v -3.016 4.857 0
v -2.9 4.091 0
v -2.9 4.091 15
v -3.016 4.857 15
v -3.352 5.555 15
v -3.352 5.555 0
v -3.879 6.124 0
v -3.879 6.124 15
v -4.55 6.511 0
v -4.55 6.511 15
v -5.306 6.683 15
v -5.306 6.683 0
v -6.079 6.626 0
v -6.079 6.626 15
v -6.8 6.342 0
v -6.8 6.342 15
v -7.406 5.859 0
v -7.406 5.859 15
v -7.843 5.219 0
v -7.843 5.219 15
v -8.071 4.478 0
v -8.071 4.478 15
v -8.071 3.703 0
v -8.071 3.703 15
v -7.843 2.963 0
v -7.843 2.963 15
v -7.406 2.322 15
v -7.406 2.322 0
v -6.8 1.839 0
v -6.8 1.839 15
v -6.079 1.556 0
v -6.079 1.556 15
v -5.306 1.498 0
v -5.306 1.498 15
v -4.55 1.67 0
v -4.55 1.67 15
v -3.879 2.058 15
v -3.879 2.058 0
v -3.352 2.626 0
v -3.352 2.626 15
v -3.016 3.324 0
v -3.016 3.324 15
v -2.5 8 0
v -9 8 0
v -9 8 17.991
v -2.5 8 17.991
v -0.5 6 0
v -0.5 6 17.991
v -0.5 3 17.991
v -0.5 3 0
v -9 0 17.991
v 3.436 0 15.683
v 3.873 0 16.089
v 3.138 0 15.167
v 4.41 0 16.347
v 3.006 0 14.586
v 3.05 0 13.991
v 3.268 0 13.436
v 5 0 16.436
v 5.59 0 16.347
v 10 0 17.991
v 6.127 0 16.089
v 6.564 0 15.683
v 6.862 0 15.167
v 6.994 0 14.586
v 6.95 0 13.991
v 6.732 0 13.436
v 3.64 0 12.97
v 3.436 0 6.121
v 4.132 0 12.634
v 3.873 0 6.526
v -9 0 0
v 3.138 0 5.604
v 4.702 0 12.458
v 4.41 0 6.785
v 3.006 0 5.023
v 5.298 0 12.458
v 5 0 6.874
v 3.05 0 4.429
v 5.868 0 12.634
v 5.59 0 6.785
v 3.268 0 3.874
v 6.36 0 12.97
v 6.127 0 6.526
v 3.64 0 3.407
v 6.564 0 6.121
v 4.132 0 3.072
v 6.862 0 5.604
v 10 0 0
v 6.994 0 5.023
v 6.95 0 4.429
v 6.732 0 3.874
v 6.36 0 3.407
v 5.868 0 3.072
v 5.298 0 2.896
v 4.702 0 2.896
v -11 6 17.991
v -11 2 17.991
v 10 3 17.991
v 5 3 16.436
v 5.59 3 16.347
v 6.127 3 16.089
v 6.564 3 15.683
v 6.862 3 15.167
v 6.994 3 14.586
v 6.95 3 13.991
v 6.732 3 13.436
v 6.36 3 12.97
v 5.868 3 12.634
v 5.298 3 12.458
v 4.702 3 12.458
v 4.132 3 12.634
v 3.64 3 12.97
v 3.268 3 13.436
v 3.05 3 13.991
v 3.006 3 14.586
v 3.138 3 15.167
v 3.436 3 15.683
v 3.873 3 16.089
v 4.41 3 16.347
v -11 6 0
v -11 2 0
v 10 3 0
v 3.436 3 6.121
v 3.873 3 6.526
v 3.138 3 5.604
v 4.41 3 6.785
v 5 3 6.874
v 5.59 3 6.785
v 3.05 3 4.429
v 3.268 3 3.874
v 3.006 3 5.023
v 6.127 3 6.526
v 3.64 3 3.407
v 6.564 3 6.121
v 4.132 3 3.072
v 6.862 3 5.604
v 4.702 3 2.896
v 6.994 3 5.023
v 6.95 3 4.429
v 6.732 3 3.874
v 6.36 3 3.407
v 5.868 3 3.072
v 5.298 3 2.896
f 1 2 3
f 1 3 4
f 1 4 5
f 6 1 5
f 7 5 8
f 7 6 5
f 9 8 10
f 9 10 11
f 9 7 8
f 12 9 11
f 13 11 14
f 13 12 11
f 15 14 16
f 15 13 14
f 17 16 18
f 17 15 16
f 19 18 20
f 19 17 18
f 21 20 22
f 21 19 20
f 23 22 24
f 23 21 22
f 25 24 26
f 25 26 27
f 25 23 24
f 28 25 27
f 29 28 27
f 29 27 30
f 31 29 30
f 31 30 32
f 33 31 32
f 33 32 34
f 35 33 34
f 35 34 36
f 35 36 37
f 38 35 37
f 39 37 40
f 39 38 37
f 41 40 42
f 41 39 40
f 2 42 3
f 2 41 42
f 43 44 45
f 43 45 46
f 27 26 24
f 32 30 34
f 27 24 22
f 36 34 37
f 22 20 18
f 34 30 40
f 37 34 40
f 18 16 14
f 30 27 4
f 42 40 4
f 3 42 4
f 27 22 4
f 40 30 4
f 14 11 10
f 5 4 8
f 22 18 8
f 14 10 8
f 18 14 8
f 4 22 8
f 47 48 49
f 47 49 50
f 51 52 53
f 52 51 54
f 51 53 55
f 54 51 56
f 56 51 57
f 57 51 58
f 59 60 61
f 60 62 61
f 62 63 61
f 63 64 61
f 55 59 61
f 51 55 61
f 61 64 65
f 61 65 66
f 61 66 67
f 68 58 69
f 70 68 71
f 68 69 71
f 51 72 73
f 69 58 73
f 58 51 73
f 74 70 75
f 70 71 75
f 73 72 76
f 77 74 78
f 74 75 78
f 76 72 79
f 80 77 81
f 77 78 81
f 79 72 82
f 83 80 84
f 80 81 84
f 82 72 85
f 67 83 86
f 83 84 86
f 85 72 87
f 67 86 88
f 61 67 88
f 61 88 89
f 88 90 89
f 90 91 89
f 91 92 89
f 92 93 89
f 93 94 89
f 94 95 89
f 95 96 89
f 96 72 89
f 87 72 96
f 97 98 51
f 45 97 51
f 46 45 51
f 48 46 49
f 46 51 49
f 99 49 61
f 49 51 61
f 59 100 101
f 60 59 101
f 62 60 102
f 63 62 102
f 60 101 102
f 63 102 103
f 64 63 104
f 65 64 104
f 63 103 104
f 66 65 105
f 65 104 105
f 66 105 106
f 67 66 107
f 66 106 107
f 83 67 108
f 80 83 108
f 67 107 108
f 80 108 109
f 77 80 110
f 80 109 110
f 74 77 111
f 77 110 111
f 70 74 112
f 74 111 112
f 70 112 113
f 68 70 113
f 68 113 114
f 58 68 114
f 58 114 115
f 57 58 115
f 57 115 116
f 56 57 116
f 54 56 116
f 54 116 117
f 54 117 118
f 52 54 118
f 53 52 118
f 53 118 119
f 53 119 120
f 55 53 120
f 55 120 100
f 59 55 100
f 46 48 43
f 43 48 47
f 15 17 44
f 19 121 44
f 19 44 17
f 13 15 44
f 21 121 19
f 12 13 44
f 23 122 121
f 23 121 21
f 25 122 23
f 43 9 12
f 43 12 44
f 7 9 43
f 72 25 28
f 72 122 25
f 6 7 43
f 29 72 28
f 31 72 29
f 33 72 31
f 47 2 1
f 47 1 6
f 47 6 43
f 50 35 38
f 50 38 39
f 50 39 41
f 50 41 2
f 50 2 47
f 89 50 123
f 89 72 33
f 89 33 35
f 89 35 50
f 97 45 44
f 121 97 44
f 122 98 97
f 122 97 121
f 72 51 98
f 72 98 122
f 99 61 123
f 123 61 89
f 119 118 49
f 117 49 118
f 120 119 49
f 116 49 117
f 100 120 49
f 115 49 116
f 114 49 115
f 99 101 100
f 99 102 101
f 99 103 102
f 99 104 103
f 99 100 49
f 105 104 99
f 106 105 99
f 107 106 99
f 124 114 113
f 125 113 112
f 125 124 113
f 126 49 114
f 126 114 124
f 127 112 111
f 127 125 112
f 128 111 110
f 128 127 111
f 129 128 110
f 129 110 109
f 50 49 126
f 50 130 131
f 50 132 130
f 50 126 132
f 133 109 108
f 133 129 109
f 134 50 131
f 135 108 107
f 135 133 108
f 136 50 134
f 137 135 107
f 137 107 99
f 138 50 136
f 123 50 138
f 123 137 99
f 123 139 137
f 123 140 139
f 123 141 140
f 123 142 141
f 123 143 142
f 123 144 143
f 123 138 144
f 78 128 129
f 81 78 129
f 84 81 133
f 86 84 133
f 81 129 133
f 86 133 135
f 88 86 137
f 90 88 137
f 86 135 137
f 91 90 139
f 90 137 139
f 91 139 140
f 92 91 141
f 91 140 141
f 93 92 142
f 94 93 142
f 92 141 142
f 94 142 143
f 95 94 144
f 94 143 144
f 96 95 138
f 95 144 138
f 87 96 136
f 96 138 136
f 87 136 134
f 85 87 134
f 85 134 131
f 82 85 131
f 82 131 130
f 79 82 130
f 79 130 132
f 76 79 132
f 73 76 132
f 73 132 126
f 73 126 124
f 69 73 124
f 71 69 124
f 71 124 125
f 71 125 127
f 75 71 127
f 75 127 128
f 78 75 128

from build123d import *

# Parameters (mm, degrees)
SKETCH_1_W          = 21
SKETCH_1_H          = 17.990855805
EXTRUDE_1_DEPTH     = 8
SKETCH_2_W          = 10.499999995
SKETCH_2_H          = 17.994369167
CUT_EXTRUDE_1_DEPTH = 5
SKETCH_3_R          = 1.999999882
SKETCH_3_R_2        = 1.999999942
CUT_EXTRUDE_2_DEPTH = 22.671891763
SKETCH_4_R          = 2.6
CUT_EXTRUDE_3_DEPTH = 15
CHAMFER_1_SIZE      = 2


with BuildPart() as part:
    # Эскиз1 → Вытянуть1 (new body)
    with BuildSketch(Plane(origin=(0, 0, 0), x_dir=(1, 0, 0), z_dir=(0, 1, 0))):
        with Locations((-0.5, -8.995427903)):
            Rectangle(SKETCH_1_W, SKETCH_1_H)
    extrude(amount=EXTRUDE_1_DEPTH)

    # Эскиз2 → Вырез-Вытянуть1 (cut)
    with BuildSketch(Plane(origin=(0, 8, 0), x_dir=(1, 0, 0), z_dir=(0, 1, 0))):
        with Locations((4.749999998, -8.993671222)):
            Rectangle(SKETCH_2_W, SKETCH_2_H)
    extrude(amount=-CUT_EXTRUDE_1_DEPTH, mode=Mode.SUBTRACT)

    # Эскиз3 → Вырез-Вытянуть2 (cut, through all)
    with BuildSketch(Plane(origin=(0, 3, 0), x_dir=(1, 0, 0), z_dir=(0, 1, 0))):
        with Locations(Location((4.999999995, -14.436118586, 0), (0, 0, 270))):
            Circle(SKETCH_3_R)
        with Locations(Location((4.999999995, -4.873583798, 0), (0, 0, 270))):
            Circle(SKETCH_3_R_2)
    extrude(amount=-CUT_EXTRUDE_2_DEPTH, mode=Mode.SUBTRACT)

    # Эскиз4 → Вырез-Вытянуть3 (cut)
    with BuildSketch(Plane.XY):
        with Locations((-5.500000032, 4.090743194)):
            Circle(SKETCH_4_R)
    extrude(amount=CUT_EXTRUDE_3_DEPTH, mode=Mode.SUBTRACT)

    # Фаска1
    chamfer_1_edges = [part.edges().sort_by_distance(p)[0] for p in [
        (-0.5, 8, 8.995427902),
        (-11, 8, 8.995427902),
        (-11, 0, 8.995427902),
    ]]
    chamfer(chamfer_1_edges, length=CHAMFER_1_SIZE)


solid = part.part
